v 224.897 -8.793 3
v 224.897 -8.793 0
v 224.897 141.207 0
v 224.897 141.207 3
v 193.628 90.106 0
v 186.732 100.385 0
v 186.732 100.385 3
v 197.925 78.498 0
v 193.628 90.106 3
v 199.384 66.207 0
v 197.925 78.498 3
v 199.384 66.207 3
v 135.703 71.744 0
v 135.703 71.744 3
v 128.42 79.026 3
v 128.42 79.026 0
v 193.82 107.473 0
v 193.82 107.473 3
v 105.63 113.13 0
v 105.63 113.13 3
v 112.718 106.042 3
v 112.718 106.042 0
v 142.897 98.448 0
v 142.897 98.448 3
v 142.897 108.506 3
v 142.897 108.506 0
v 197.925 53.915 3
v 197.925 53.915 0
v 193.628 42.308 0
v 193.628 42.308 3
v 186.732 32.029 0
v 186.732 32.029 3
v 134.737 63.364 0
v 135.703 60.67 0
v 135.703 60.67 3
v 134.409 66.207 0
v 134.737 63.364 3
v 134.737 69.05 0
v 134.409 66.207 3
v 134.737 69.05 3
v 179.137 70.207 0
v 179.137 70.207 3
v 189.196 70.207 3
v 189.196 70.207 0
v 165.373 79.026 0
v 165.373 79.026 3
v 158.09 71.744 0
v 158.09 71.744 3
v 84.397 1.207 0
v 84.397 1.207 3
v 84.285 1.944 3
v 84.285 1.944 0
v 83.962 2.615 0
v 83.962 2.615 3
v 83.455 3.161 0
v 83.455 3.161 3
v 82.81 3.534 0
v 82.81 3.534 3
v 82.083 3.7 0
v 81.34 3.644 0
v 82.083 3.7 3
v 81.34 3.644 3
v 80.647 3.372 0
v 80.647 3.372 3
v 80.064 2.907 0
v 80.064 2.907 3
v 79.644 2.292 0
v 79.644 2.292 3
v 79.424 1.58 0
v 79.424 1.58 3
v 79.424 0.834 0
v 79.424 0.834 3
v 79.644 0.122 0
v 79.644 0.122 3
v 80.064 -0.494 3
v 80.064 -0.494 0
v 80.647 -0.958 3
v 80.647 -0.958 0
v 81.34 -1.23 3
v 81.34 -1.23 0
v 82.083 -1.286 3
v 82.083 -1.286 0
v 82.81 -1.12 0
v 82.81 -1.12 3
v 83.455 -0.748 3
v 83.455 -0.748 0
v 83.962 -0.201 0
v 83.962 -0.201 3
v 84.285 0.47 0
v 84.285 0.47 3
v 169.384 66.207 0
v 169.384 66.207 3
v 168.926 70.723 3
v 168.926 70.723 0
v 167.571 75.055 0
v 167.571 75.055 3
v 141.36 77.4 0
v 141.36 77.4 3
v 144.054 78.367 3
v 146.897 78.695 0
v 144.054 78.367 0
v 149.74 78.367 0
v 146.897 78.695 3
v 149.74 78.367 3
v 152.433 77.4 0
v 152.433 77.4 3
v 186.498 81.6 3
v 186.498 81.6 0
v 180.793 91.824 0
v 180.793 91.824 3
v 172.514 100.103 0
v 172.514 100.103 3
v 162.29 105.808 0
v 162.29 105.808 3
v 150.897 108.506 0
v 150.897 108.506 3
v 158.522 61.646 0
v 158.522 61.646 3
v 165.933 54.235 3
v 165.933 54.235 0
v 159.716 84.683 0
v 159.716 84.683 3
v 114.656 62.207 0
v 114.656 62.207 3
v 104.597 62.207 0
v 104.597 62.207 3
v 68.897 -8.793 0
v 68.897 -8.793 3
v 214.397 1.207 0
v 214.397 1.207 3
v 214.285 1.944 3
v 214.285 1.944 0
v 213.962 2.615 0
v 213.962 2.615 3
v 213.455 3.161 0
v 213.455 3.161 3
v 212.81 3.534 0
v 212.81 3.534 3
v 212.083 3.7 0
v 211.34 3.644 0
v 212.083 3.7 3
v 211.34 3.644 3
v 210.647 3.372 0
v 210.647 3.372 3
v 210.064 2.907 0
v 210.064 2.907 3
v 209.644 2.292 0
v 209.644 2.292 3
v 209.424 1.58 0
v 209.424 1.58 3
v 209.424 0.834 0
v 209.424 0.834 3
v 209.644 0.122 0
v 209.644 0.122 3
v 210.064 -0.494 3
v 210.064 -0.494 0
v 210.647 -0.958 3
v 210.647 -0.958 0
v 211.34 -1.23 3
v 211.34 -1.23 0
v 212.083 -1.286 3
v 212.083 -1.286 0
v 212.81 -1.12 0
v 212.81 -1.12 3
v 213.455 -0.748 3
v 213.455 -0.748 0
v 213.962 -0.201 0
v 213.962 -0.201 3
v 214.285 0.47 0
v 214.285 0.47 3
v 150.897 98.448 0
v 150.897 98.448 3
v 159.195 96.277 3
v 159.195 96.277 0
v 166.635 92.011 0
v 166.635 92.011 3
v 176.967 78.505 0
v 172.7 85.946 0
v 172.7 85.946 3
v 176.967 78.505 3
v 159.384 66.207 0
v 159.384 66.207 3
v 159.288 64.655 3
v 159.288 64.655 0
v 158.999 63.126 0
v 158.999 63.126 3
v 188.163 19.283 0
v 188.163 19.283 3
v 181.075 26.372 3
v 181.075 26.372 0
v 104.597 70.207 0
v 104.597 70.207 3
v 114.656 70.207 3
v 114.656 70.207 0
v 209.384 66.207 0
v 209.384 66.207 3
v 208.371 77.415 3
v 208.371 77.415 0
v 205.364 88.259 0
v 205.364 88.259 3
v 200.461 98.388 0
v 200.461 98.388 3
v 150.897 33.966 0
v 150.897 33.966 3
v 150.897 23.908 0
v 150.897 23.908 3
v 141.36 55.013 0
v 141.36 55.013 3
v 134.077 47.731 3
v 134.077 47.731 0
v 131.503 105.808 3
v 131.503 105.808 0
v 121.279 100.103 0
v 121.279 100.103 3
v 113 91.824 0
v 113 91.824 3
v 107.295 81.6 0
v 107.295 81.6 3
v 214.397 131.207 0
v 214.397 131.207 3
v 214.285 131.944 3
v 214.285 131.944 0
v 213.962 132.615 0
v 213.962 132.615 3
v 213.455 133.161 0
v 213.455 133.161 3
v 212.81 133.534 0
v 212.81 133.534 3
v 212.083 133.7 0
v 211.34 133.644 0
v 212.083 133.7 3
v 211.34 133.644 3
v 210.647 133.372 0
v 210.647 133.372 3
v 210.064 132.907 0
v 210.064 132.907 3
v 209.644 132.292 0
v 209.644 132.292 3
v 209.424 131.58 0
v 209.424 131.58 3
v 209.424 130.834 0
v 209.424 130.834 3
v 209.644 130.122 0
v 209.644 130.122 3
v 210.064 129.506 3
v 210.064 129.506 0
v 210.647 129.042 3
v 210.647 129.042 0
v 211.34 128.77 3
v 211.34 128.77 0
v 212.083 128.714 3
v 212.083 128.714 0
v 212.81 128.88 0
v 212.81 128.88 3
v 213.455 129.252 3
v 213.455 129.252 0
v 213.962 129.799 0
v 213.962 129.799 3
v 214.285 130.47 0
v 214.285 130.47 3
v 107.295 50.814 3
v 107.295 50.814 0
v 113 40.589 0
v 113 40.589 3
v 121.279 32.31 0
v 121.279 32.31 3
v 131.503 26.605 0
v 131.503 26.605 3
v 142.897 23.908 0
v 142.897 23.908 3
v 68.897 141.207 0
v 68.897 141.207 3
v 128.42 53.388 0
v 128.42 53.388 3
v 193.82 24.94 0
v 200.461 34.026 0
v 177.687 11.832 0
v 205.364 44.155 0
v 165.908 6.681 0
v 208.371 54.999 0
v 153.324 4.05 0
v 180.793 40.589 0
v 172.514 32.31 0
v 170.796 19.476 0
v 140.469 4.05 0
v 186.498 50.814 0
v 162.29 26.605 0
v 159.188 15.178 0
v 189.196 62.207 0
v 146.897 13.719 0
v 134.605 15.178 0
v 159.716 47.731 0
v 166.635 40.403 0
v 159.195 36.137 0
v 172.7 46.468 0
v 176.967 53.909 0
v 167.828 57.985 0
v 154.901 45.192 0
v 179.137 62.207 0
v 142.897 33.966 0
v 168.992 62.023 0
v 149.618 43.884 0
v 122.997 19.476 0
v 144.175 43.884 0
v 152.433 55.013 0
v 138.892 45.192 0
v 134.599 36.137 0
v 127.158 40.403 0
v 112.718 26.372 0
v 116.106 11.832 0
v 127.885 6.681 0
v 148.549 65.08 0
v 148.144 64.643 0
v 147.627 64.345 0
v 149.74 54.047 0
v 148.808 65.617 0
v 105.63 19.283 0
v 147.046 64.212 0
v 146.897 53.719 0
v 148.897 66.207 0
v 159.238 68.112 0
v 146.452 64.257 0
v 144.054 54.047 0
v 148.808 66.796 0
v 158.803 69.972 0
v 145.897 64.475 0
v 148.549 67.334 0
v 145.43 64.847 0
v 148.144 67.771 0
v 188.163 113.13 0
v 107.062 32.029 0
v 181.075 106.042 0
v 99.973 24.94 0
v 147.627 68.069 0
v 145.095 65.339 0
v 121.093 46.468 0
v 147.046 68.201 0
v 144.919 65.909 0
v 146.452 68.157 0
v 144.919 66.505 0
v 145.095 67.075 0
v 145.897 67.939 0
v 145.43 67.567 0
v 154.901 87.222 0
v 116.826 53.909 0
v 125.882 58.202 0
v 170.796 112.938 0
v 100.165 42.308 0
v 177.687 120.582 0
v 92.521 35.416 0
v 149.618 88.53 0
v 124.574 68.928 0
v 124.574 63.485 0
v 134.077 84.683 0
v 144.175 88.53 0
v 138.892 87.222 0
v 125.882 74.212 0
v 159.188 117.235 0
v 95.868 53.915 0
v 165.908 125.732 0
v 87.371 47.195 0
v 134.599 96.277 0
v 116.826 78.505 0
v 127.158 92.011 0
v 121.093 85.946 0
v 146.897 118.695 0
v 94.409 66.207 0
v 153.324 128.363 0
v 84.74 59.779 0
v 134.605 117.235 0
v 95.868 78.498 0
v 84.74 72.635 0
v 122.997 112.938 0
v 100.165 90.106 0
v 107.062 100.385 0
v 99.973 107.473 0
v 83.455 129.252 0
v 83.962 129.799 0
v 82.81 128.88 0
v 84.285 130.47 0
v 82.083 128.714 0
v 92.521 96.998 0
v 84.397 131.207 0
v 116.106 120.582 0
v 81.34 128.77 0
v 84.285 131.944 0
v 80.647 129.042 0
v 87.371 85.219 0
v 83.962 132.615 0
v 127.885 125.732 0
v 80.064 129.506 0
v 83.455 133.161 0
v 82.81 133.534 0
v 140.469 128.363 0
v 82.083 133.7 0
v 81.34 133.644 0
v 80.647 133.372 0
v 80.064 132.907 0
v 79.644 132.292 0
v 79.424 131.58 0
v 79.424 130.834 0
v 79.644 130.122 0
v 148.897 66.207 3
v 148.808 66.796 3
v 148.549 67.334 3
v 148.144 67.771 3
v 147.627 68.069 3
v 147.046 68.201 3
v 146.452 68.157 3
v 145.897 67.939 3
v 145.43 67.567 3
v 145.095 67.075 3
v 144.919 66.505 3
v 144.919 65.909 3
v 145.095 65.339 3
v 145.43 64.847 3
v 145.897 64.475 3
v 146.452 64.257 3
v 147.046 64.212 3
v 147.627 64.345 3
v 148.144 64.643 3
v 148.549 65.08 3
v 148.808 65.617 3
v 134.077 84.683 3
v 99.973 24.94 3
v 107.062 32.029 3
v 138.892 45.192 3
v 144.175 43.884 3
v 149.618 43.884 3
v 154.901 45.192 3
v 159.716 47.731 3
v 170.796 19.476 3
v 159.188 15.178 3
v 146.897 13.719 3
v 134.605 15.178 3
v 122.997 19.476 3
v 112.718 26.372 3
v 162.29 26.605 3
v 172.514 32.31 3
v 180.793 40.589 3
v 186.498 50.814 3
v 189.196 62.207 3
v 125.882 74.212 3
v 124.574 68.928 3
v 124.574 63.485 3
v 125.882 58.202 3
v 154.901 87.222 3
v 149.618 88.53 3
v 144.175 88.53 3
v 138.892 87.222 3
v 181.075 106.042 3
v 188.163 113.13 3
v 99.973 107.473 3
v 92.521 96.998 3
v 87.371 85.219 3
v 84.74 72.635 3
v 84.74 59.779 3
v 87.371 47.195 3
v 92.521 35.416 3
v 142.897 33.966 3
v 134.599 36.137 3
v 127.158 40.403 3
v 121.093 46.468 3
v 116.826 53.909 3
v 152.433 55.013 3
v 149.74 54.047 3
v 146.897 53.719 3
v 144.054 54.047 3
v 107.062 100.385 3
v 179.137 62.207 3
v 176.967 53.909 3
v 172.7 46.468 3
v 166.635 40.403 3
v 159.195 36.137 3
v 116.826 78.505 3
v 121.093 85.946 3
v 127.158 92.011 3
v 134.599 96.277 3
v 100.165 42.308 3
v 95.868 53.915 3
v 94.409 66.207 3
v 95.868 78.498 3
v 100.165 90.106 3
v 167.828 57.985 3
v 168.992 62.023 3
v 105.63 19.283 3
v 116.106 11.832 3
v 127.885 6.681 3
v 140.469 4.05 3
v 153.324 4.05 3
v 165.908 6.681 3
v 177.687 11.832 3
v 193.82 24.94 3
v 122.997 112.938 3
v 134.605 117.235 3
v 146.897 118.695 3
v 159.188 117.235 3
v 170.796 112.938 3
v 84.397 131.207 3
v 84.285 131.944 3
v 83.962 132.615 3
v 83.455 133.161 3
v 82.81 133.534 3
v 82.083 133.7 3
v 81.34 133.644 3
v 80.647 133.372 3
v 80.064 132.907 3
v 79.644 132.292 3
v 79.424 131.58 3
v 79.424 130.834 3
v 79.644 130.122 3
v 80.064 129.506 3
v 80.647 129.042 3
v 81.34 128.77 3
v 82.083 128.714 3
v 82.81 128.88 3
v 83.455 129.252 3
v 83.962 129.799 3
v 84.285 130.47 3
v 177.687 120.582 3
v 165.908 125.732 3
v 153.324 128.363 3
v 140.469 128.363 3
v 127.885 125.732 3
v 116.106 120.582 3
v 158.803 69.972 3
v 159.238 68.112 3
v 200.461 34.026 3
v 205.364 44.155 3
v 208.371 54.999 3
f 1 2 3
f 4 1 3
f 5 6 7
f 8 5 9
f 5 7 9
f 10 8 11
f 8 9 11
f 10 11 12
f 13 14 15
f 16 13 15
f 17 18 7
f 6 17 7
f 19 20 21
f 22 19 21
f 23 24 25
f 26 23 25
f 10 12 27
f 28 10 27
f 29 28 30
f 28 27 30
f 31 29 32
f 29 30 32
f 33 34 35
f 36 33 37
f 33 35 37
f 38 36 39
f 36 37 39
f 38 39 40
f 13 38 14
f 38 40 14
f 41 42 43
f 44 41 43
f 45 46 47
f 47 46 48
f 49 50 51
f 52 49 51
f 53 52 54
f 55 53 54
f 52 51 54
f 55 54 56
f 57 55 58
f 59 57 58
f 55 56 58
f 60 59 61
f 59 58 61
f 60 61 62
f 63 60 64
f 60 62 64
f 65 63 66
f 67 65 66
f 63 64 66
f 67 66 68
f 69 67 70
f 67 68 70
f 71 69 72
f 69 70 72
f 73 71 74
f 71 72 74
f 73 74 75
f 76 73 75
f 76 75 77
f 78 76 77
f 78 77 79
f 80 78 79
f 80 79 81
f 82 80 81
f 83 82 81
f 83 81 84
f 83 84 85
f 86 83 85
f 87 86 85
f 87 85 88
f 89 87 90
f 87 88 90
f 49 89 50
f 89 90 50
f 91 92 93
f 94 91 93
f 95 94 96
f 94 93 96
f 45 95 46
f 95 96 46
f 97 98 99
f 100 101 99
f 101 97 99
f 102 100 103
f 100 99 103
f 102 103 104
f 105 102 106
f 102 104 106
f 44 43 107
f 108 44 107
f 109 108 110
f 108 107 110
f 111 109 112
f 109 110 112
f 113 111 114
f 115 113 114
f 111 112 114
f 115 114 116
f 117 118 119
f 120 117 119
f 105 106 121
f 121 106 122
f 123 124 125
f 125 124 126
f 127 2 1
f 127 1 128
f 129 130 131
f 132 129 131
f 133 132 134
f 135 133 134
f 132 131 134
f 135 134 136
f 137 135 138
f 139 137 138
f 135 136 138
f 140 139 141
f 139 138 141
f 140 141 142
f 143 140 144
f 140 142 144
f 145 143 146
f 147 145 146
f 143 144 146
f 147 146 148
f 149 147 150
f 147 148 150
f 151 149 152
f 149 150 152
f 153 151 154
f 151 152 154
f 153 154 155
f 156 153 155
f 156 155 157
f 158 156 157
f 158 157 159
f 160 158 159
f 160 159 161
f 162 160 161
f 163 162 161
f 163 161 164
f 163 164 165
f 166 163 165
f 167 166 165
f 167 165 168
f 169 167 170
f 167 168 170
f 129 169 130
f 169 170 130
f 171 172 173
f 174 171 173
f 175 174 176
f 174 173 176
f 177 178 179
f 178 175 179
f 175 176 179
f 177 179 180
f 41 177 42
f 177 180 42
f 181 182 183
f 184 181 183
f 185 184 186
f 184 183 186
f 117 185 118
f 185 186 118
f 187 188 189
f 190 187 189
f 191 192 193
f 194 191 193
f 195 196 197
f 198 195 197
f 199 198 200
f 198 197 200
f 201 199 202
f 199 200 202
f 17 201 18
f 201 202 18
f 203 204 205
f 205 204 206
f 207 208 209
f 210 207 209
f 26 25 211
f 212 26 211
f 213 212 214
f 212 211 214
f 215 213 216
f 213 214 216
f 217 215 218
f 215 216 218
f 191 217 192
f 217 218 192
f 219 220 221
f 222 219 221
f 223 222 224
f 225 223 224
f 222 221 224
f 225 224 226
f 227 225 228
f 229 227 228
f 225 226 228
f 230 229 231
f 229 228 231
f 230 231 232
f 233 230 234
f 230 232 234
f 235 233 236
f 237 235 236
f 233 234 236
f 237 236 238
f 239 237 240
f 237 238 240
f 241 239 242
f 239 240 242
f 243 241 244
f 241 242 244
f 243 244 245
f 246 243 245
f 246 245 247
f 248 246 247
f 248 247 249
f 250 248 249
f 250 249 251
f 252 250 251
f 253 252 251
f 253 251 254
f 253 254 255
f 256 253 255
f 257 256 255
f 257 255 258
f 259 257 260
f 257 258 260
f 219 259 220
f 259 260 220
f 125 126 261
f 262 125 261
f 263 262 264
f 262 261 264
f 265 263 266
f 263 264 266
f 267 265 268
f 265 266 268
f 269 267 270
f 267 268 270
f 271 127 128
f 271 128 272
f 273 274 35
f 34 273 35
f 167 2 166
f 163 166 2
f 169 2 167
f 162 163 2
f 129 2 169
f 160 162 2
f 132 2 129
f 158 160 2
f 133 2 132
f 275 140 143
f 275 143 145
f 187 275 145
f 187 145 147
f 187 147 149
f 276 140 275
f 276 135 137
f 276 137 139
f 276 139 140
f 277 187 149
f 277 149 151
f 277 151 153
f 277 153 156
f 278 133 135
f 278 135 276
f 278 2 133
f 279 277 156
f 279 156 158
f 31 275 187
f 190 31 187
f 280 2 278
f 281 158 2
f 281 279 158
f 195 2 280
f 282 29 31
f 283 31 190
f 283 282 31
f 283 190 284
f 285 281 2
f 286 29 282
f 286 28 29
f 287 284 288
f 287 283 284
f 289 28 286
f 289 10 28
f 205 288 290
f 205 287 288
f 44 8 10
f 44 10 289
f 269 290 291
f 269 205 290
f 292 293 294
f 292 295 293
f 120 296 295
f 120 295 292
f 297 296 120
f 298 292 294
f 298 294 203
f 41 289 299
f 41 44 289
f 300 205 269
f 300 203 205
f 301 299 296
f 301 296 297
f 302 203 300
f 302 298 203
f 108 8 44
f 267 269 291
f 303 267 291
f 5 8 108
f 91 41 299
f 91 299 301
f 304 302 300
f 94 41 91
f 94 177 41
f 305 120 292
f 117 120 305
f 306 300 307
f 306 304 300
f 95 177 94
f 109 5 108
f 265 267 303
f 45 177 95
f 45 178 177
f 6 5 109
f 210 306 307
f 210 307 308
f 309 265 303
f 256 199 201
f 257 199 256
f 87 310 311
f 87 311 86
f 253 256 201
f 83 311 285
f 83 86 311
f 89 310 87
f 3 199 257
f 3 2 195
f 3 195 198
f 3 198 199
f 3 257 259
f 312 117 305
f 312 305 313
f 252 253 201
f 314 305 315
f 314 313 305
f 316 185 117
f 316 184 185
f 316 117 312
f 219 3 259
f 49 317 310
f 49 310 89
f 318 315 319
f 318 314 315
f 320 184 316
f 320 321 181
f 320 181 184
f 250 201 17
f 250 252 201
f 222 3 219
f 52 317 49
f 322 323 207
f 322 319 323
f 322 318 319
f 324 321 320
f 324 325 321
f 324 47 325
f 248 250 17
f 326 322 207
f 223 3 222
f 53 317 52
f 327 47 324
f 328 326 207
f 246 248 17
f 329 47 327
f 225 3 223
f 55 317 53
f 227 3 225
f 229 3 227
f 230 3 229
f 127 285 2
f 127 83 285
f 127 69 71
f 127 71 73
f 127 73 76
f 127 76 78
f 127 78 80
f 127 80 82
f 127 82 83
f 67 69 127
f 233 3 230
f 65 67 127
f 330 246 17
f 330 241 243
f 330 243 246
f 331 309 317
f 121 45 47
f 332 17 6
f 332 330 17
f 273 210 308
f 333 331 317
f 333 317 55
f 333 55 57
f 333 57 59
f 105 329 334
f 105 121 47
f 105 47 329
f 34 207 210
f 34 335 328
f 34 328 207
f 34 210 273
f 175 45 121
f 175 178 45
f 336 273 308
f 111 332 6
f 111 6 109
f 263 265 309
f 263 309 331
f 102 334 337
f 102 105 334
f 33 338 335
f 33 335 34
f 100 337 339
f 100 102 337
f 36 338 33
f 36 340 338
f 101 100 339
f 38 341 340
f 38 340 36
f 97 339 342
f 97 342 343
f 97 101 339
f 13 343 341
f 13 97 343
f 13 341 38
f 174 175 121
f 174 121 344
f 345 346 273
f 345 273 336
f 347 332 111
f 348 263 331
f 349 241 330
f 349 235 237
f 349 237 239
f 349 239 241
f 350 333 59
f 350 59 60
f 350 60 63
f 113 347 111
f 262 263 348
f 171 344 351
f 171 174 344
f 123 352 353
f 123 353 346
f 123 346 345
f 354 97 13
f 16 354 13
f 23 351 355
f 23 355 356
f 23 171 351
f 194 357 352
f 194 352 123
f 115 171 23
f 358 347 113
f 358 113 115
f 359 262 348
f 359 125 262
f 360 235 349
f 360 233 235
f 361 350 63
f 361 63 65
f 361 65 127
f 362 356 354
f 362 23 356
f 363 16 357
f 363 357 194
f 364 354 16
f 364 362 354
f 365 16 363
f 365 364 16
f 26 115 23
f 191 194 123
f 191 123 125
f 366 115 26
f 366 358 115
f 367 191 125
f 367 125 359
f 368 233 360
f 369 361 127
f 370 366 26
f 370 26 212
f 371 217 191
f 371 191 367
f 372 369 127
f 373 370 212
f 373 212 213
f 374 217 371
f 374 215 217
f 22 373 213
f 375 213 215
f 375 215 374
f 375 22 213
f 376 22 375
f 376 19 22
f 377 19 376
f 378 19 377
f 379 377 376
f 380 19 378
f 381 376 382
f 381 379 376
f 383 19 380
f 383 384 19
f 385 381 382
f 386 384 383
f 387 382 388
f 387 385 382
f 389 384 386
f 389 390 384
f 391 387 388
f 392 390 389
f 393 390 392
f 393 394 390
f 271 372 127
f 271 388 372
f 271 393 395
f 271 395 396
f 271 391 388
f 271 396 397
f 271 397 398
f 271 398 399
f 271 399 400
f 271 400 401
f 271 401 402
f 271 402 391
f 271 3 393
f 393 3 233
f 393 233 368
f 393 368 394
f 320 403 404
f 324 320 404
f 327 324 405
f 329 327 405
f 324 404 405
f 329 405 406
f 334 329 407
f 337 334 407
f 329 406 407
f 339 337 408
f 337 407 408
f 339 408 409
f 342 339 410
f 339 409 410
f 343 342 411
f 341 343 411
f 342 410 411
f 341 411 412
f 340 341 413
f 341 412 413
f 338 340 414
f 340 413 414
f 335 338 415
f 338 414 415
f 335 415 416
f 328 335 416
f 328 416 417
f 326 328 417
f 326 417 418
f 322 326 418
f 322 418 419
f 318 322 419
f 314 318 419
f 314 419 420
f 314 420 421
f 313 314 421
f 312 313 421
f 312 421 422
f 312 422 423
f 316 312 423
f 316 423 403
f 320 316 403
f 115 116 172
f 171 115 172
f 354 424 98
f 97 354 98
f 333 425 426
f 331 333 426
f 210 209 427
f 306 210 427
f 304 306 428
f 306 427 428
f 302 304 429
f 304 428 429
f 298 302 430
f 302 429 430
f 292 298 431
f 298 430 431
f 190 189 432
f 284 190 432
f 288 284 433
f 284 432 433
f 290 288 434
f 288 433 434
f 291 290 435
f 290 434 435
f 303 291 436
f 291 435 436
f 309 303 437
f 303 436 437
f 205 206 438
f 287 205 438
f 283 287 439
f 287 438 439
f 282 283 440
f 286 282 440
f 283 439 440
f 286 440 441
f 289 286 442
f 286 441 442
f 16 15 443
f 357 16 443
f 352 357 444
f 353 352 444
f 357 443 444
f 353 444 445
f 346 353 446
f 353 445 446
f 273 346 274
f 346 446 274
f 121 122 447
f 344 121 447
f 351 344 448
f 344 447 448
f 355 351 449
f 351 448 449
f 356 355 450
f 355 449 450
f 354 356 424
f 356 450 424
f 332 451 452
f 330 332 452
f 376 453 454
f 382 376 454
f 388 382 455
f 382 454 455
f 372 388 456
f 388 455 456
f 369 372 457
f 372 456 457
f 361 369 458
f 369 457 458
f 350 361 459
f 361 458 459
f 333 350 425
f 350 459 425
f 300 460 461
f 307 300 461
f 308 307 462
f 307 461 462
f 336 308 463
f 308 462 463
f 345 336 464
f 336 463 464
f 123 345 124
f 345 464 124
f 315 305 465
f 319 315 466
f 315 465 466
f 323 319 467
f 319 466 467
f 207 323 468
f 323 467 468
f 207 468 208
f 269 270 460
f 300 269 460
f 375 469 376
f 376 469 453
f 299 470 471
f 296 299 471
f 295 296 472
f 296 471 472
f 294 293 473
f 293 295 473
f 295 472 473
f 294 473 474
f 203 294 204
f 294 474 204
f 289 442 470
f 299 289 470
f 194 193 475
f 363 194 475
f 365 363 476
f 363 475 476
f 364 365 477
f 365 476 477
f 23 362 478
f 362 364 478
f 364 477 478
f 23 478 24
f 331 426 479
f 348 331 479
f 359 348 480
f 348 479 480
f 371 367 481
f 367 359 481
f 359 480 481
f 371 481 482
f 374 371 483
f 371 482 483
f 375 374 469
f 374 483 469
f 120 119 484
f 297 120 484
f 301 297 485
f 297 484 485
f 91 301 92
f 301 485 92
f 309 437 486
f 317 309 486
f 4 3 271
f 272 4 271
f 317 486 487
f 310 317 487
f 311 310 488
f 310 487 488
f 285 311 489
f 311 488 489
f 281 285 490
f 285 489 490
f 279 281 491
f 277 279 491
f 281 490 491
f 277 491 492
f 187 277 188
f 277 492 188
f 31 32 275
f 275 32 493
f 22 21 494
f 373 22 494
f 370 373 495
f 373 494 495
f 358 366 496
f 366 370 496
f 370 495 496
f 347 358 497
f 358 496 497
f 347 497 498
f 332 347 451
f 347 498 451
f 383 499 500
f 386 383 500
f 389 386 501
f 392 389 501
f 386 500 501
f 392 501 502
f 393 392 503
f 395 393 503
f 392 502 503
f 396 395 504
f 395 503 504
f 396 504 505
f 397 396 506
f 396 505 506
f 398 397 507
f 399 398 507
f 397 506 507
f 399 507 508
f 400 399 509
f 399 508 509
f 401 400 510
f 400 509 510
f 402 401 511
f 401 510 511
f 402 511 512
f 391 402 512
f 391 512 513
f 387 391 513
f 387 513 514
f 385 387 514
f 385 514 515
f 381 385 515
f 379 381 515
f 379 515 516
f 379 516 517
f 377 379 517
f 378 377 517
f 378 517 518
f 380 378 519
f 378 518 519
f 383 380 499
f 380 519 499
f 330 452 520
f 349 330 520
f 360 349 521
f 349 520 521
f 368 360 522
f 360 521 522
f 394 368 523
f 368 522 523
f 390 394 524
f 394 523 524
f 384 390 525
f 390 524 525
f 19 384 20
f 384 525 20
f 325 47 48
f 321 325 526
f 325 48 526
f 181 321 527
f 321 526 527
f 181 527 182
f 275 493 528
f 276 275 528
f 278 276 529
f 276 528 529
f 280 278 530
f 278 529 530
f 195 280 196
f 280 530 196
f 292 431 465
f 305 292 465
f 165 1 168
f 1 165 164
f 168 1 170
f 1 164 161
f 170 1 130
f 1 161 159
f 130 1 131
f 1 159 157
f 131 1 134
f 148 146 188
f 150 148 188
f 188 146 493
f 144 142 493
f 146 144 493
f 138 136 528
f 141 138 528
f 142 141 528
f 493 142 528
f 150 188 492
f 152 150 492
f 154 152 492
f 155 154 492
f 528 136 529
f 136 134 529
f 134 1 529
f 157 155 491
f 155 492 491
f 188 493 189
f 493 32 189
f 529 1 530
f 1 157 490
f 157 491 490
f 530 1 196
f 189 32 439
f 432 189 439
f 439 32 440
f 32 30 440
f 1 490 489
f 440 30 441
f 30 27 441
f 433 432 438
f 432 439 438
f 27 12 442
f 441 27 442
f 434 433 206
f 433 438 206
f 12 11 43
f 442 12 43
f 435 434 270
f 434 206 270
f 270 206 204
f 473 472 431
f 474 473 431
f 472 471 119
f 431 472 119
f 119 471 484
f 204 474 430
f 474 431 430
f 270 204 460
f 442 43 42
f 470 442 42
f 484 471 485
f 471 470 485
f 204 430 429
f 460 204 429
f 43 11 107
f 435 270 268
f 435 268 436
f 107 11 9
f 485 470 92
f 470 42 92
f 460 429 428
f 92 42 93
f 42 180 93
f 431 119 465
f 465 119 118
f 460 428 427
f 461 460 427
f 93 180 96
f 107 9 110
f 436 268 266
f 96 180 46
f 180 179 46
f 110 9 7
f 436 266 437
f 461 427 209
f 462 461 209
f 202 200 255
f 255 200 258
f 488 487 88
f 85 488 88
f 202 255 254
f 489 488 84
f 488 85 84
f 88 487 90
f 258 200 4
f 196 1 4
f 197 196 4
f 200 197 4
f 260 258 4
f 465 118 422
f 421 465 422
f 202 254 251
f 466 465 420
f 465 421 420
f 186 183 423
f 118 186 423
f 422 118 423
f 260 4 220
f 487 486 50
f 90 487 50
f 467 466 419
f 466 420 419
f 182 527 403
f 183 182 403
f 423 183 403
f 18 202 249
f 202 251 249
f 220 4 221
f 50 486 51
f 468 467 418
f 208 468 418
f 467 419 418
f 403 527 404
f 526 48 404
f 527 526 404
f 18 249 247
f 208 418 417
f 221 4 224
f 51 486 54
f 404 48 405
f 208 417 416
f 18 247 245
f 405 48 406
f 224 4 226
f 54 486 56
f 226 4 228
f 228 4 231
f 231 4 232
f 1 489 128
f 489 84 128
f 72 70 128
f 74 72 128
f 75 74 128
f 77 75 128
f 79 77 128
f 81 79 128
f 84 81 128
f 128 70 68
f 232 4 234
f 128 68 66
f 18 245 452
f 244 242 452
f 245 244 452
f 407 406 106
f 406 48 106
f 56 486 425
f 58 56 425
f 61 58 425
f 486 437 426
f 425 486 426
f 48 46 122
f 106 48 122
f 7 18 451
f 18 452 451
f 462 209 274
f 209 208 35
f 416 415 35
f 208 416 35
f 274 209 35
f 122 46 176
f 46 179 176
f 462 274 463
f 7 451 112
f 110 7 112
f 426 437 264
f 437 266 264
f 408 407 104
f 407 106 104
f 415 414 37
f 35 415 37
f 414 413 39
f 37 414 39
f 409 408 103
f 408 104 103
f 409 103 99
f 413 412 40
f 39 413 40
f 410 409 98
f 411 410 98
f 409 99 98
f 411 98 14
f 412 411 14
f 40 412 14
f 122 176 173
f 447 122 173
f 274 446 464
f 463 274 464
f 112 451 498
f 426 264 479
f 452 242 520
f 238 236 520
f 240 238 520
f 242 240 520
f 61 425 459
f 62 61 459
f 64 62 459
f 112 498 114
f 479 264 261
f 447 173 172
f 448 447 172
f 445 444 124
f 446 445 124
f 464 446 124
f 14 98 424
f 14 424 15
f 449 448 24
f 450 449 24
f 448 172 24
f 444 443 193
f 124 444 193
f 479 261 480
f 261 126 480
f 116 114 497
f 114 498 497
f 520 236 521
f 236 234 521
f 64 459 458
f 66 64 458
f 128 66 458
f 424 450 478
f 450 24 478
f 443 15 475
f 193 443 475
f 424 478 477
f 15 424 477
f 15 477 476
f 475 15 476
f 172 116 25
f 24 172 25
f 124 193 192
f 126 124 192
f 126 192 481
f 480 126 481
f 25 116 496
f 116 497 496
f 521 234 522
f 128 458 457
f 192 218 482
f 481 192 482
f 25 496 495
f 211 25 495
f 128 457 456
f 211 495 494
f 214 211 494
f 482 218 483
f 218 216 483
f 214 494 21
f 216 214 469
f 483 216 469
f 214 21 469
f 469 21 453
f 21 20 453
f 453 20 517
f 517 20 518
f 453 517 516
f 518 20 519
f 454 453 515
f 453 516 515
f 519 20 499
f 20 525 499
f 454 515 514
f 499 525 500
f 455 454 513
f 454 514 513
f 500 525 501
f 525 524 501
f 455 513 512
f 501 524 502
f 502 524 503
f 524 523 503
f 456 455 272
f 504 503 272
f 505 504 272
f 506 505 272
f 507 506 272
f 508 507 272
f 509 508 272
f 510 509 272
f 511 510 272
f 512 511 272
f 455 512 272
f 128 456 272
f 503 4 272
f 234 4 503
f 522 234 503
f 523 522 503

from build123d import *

# Parameters (mm, degrees)
SKETCH1_W           = 150
SKETCH1_H           = 150
BOSS_EXTRUDE1_DEPTH = 3
CUT_EXTRUDE1_DEPTH  = 264.0332057
SKETCH4_R           = 2.5
CUT_EXTRUDE2_DEPTH  = 3
SKETCH5_W           = 3
SKETCH5_H           = 150
BOSS_EXTRUDE2_DEPTH = 3
SKETCH6_R           = 2
CUT_EXTRUDE3_DEPTH  = 10


with BuildPart() as part:
    # Sketch1 → Boss-Extrude1 (new body)
    with BuildSketch(Plane.XY):
        with Locations((146.896551724, 66.206896552)):
            Rectangle(SKETCH1_W, SKETCH1_H)
    extrude(amount=BOSS_EXTRUDE1_DEPTH)

    # Sketch2 → Cut-Extrude1 (cut, through all)
    with BuildSketch(Plane.XY.offset(3)):
        with BuildLine():
            ThreePointArc((188.163122783, 113.13032186), (146.896551724, 128.694797217), (105.629980666, 113.13032186))
            Line((105.629980666, 113.13032186), (112.718359737, 106.041942789))
            ThreePointArc((112.718359737, 106.041942789), (146.896551724, 118.694797217), (181.074743712, 106.041942789))
            Line((181.074743712, 106.041942789), (188.163122783, 113.13032186))
        make_face()
        with BuildLine():
            Line((107.061505487, 100.385088539), (99.973126416, 107.47346761))
            ThreePointArc((99.973126416, 107.47346761), (84.408651059, 66.206896552), (99.973126416, 24.940325493))
            Line((99.973126416, 24.940325493), (107.061505487, 32.028704564))
            ThreePointArc((107.061505487, 32.028704564), (94.408651059, 66.206896552), (107.061505487, 100.385088539))
        make_face()
        with BuildLine():
            ThreePointArc((209.384452389, 66.206896552), (205.363995952, 88.259009716), (193.819977032, 107.47346761))
            Line((193.819977032, 107.47346761), (186.731597961, 100.385088539))
            ThreePointArc((186.731597961, 100.385088539), (196.119705149, 84.429434333), (199.384452389, 66.206896552))
            ThreePointArc((199.384452389, 66.206896552), (196.119705149, 47.984358771), (186.731597961, 32.028704564))
            Line((186.731597961, 32.028704564), (193.819977032, 24.940325493))
            ThreePointArc((193.819977032, 24.940325493), (205.363995952, 44.154783387), (209.384452389, 66.206896552))
        make_face()
        with BuildLine():
            Line((112.718359737, 26.371850315), (105.629980666, 19.283471244))
            ThreePointArc((105.629980666, 19.283471244), (146.896551724, 3.718995886), (188.163122783, 19.283471244))
            Line((188.163122783, 19.283471244), (181.074743712, 26.371850315))
            ThreePointArc((181.074743712, 26.371850315), (146.896551724, 13.718995886), (112.718359737, 26.371850315))
        make_face()
        with BuildLine():
            ThreePointArc((150.896551724, 23.907703853), (176.940034403, 36.163413873), (189.195744423, 62.206896552))
            Line((189.195744423, 62.206896552), (179.137266506, 62.206896552))
            ThreePointArc((179.137266506, 62.206896552), (169.868966591, 43.234481685), (150.896551724, 33.96618177))
            Line((150.896551724, 33.96618177), (150.896551724, 23.907703853))
        make_face()
        with BuildLine():
            Line((114.655836942, 62.206896552), (104.597359026, 62.206896552))
            ThreePointArc((104.597359026, 62.206896552), (116.853069045, 36.163413873), (142.896551724, 23.907703853))
            Line((142.896551724, 23.907703853), (142.896551724, 33.96618177))
            ThreePointArc((142.896551724, 33.96618177), (123.924136857, 43.234481685), (114.655836942, 62.206896552))
        make_face()
        with BuildLine():
            Line((142.896551724, 98.447611333), (142.896551724, 108.50608925))
            ThreePointArc((142.896551724, 108.50608925), (116.853069045, 96.250379231), (104.597359026, 70.206896552))
            Line((104.597359026, 70.206896552), (114.655836942, 70.206896552))
            ThreePointArc((114.655836942, 70.206896552), (123.924136857, 89.179311419), (142.896551724, 98.447611333))
        make_face()
        with BuildLine():
            ThreePointArc((189.195744423, 70.206896552), (176.940034403, 96.250379231), (150.896551724, 108.50608925))
            Line((150.896551724, 108.50608925), (150.896551724, 98.447611333))
            ThreePointArc((150.896551724, 98.447611333), (169.868966591, 89.179311419), (179.137266506, 70.206896552))
            Line((179.137266506, 70.206896552), (189.195744423, 70.206896552))
        make_face()
        with BuildLine():
            Line((165.372753073, 79.026243651), (158.090015102, 71.74350568))
            ThreePointArc((158.090015102, 71.74350568), (159.056537781, 69.049853135), (159.384452389, 66.206896552))
            ThreePointArc((159.384452389, 66.206896552), (159.166880972, 63.885973637), (158.521748029, 61.645923641))
            Line((158.521748029, 61.645923641), (165.932760465, 54.234911206))
            ThreePointArc((165.932760465, 54.234911206), (168.504305512, 59.977076926), (169.384452389, 66.206896552))
            ThreePointArc((169.384452389, 66.206896552), (168.358106385, 72.923096956), (165.372753073, 79.026243651))
        make_face()
        with BuildLine():
            Line((134.077204625, 84.6830979), (141.359942596, 77.400359929))
            ThreePointArc((141.359942596, 77.400359929), (146.896551724, 78.694797217), (152.433160852, 77.400359929))
            Line((152.433160852, 77.400359929), (159.715898823, 84.6830979))
            ThreePointArc((159.715898823, 84.6830979), (146.896551724, 88.694797217), (134.077204625, 84.6830979))
        make_face()
        with BuildLine():
            ThreePointArc((135.703088346, 60.670287424), (134.408651059, 66.206896552), (135.703088346, 71.74350568))
            Line((135.703088346, 71.74350568), (128.420350375, 79.026243651))
            ThreePointArc((128.420350375, 79.026243651), (124.408651059, 66.206896552), (128.420350375, 53.387549452))
            Line((128.420350375, 53.387549452), (135.703088346, 60.670287424))
        make_face()
        with BuildLine():
            ThreePointArc((152.433160852, 55.013433174), (146.896551724, 53.718995886), (141.359942596, 55.013433174))
            Line((141.359942596, 55.013433174), (134.077204625, 47.730695203))
            ThreePointArc((134.077204625, 47.730695203), (146.896551724, 43.718995886), (159.715898823, 47.730695203))
            Line((159.715898823, 47.730695203), (152.433160852, 55.013433174))
        make_face()
    extrude(amount=-CUT_EXTRUDE1_DEPTH, mode=Mode.SUBTRACT)

    # Sketch4 → Cut-Extrude2 (cut)
    with BuildSketch(Plane.XY.offset(3)):
        with Locations((81.896551724, 131.206896552)):
            Circle(SKETCH4_R)
        with Locations((211.896551724, 131.206896552)):
            Circle(SKETCH4_R)
        with Locations((211.896551724, 1.206896552)):
            Circle(SKETCH4_R)
        with Locations((81.896551724, 1.206896552)):
            Circle(SKETCH4_R)
    extrude(amount=-CUT_EXTRUDE2_DEPTH, mode=Mode.SUBTRACT)

    # Sketch5 → Boss-Extrude2 (add)
    with BuildSketch(Plane(origin=(0, 0, 0), x_dir=(-1, 0, 0), z_dir=(0, 0, -1))):
        with Locations((-223.396551724, 66.206896552)):
            Rectangle(SKETCH5_W, SKETCH5_H)
        with Locations((-70.396551724, 66.206896552)):
            Rectangle(SKETCH5_W, SKETCH5_H)
    extrude(amount=-BOSS_EXTRUDE2_DEPTH)

    # Sketch6 → Cut-Extrude3 (cut)
    with BuildSketch(Plane.XY.offset(3)):
        with Locations((146.896551724, 66.206896552)):
            Circle(SKETCH6_R)
    extrude(amount=-CUT_EXTRUDE3_DEPTH, mode=Mode.SUBTRACT)


solid = part.part
